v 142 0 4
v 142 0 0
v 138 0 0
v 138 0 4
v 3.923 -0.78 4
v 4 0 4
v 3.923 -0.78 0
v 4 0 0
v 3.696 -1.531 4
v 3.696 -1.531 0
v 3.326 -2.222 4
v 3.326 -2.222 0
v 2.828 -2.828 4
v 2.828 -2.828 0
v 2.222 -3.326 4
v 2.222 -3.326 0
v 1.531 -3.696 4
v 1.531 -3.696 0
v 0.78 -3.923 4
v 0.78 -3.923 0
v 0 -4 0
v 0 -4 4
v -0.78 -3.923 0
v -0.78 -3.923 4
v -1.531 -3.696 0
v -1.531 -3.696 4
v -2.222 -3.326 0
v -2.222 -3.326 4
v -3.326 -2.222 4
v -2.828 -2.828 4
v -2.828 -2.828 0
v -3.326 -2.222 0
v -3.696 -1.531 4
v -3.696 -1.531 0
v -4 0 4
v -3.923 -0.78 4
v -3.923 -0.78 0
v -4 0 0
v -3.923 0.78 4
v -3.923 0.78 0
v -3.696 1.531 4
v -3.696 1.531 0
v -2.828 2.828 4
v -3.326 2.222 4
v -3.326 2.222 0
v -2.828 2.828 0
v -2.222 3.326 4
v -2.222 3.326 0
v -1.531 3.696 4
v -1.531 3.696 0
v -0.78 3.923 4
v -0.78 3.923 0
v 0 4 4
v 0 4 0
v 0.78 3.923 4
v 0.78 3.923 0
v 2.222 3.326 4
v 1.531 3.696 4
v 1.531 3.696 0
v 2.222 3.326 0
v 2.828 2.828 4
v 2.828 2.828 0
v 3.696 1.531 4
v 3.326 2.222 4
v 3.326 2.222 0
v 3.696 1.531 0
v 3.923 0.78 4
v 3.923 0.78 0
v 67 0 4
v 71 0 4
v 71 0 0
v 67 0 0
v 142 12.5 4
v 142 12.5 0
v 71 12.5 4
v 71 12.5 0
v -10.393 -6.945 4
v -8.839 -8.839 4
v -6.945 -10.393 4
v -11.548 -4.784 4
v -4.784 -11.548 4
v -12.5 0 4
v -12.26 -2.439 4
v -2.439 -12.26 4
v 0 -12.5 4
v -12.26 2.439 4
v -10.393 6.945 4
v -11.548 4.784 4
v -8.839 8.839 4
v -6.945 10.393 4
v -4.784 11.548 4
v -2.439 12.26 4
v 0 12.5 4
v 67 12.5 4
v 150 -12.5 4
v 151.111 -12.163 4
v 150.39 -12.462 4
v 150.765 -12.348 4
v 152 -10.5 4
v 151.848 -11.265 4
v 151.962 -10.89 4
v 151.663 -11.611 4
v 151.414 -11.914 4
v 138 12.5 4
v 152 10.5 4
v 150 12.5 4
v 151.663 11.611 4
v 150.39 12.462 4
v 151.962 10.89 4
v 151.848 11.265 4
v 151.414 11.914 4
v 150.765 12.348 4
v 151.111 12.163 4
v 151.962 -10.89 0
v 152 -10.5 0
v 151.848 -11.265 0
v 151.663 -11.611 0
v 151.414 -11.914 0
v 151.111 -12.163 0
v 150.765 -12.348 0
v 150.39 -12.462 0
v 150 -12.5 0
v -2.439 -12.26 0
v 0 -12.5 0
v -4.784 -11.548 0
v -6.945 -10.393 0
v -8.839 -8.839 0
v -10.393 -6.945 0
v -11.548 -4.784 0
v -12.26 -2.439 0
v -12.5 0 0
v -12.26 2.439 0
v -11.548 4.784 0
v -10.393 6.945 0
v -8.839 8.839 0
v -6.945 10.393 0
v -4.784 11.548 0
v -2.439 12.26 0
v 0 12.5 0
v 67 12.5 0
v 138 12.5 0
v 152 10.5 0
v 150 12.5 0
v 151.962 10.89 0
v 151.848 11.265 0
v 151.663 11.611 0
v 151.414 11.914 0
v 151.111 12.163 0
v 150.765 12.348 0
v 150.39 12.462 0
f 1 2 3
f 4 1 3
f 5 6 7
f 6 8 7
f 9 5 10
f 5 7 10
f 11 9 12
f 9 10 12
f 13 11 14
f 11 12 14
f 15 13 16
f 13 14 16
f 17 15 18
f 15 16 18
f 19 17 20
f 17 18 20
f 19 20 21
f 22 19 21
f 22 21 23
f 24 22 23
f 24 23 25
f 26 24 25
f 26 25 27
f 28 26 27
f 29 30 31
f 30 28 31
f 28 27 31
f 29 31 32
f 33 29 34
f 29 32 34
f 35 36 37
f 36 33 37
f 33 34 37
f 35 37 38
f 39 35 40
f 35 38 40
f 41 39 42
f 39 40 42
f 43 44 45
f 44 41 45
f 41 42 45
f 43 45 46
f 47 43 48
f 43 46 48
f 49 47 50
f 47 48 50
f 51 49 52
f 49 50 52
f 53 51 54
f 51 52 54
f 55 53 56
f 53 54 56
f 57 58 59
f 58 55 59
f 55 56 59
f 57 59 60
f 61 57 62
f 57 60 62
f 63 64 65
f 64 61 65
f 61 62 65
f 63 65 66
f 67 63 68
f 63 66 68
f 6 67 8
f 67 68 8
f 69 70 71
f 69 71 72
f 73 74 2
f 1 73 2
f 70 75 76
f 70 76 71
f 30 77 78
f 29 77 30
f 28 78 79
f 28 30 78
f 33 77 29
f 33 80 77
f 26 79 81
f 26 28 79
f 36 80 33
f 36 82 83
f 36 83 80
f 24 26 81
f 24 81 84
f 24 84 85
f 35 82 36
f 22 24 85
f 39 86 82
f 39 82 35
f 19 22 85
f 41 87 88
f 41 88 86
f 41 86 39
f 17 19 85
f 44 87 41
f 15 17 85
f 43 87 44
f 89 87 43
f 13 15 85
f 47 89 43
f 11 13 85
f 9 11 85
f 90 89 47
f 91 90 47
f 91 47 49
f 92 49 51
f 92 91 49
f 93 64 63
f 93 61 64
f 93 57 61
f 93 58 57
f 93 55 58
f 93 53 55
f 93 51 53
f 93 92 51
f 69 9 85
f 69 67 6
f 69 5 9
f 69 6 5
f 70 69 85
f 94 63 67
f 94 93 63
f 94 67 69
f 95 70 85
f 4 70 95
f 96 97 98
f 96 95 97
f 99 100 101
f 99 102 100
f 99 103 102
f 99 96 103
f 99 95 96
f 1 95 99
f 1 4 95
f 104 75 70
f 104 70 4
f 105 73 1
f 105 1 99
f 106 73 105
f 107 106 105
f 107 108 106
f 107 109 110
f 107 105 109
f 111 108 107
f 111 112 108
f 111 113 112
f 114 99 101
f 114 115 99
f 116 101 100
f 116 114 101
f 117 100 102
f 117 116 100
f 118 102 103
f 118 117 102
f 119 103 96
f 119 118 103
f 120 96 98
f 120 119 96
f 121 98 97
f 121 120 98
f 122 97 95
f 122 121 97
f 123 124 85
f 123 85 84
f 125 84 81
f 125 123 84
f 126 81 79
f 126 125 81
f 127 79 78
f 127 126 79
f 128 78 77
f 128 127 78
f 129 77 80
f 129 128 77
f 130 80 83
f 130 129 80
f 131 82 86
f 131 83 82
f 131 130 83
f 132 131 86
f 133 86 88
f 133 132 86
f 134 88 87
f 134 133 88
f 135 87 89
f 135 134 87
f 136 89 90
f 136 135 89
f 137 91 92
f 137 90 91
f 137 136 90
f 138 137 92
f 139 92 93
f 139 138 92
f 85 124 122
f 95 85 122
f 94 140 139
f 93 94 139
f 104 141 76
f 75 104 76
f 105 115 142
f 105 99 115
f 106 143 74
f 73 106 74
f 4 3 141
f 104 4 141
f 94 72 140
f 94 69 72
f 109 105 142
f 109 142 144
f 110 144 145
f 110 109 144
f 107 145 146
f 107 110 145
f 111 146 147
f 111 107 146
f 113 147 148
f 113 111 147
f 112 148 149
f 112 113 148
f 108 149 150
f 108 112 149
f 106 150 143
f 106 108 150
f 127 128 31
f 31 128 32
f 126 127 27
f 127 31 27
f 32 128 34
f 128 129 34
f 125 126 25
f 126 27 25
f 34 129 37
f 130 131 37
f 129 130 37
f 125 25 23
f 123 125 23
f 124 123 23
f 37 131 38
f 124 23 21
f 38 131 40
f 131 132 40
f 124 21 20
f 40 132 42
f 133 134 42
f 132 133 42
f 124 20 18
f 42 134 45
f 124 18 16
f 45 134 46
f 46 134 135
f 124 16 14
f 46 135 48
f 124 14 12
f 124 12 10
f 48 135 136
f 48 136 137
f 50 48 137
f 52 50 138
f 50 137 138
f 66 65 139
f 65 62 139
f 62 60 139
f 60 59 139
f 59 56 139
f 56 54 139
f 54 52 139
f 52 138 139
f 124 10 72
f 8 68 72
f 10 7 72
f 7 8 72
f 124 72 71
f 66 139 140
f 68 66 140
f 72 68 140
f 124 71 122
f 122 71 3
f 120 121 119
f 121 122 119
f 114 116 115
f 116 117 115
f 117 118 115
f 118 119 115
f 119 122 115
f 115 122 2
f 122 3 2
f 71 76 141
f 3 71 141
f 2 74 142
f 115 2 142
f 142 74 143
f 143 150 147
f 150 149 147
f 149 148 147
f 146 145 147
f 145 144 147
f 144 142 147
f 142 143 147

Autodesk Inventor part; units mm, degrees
ref_plane "YZ Plane" through (0, 0, 0) normal (1, 0, 0) x (0, 1, 0)
ref_plane "XZ Plane" through (0, 0, 0) normal (0, 1, 0) x (-1, 0, 0)
ref_plane "XY Plane" through (0, 0, 0) normal (0, 0, 1) x (1, 0, 0)
sketch "Эскиз1" plane through (0, 0, 0) normal (0, 0, 1) x (1, 0, 0)
  circle A0 centre (0, 0) radius 12.5
  line L0 (0, -12.5) -> (280, -12.5)
  line L1 (280, -12.5) -> (280, 12.5)
  line L2 (280, 12.5) -> (0, 12.5)
  line L3 (0, 12.5) -> (0, -12.5)
  circle A1 centre (280, 0) radius 12.5
  circle A2 centre (0, 0) radius 7
  circle A3 centre (280, 0) radius 7
  circle A4 centre (0, 0) radius 4
  circle A5 centre (280, 0) radius 3
  circle A6 centre (287, 0) radius 1.5
  circle A7 centre (280, 7) radius 1.5
  circle A8 centre (280, -7) radius 1.5
  circle A9 centre (287, 0) radius 1.5
  line L4 (138, 12.5) -> (142, 12.5)
  line L5 (142, 12.5) -> (142, 0)
  line L6 (142, 0) -> (138, 0)
  line L7 (138, 0) -> (138, 12.5)
  point P0 (280, -12.5)
  point P1 (140, 12.5)
  point P2 (140, 12.5)
  point P3 (142, 12.5)
  point P4 (140, 0)
  dimension "d0" = 25
  dimension "d1" = 280
  dimension "d2" = 14
  dimension "d3" = 14
  dimension "d8" = 8
  dimension "d9" = 6
  dimension "d10" = 3
  dimension "d11" = 3
  dimension "d12" = 3
  dimension "d13" = 3
  dimension "d16" = 0
  dimension "d17" = 4
  dimension "d26" = 140
extrude "Выдавливание1" add sketch "Эскиз1" along normal blind 4 contours A0 L3 A2 | A0 L2 L7 L6 L5 A1 L0 | L3 A2 A0 | A2 L3 A4 | L3 A4 A2 | A1 L1 A7 A3 A8 | L1 A8 A3 A6 A7 A1 | A3 A7 L1 A5 A8 | L1 A5 A7 A3 A6 A8
sketch "Эскиз2" plane through (0, 0, 4) normal (0, 0, 1) x (1, 0, 0)
  line L0 (152, 23.4347) -> (359.1429, 23.4347)
  line L1 (359.1429, 23.4347) -> (359.1429, -33.9487)
  line L2 (359.1429, -33.9487) -> (152, -33.9487)
  line L3 (152, -33.9487) -> (152, 23.4347)
  line L4 (142, 12.5) -> (142, 0) projected
  point P0 (0, 0)
  dimension "d18" = 10
extrude "Выдавливание2" cut sketch "Эскиз2" against normal blind 10
fillet "Сопряжение1" radius 2 2 edges at (152, 12.5, 2) (152, -12.5, 2)
sketch "Эскиз3" plane through (0, 0, 4) normal (0, 0, 1) x (1, 0, 0)
  line L0 (138, 12.5) -> (0, 12.5) projected
  line L1 (67, 12.5) -> (71, 12.5)
  line L2 (71, 12.5) -> (71, 0)
  line L3 (71, 0) -> (67, 0)
  line L4 (67, 0) -> (67, 12.5)
  point P0 (0, 0)
  point P1 (69, 12.5)
  point P2 (69, 12.5)
  point P3 (71, 12.5)
  dimension "d22" = 0
  dimension "d23" = 4
extrude "Выдавливание3" cut sketch "Эскиз3" against normal blind 10
properties material "Дерево (вишня)"
